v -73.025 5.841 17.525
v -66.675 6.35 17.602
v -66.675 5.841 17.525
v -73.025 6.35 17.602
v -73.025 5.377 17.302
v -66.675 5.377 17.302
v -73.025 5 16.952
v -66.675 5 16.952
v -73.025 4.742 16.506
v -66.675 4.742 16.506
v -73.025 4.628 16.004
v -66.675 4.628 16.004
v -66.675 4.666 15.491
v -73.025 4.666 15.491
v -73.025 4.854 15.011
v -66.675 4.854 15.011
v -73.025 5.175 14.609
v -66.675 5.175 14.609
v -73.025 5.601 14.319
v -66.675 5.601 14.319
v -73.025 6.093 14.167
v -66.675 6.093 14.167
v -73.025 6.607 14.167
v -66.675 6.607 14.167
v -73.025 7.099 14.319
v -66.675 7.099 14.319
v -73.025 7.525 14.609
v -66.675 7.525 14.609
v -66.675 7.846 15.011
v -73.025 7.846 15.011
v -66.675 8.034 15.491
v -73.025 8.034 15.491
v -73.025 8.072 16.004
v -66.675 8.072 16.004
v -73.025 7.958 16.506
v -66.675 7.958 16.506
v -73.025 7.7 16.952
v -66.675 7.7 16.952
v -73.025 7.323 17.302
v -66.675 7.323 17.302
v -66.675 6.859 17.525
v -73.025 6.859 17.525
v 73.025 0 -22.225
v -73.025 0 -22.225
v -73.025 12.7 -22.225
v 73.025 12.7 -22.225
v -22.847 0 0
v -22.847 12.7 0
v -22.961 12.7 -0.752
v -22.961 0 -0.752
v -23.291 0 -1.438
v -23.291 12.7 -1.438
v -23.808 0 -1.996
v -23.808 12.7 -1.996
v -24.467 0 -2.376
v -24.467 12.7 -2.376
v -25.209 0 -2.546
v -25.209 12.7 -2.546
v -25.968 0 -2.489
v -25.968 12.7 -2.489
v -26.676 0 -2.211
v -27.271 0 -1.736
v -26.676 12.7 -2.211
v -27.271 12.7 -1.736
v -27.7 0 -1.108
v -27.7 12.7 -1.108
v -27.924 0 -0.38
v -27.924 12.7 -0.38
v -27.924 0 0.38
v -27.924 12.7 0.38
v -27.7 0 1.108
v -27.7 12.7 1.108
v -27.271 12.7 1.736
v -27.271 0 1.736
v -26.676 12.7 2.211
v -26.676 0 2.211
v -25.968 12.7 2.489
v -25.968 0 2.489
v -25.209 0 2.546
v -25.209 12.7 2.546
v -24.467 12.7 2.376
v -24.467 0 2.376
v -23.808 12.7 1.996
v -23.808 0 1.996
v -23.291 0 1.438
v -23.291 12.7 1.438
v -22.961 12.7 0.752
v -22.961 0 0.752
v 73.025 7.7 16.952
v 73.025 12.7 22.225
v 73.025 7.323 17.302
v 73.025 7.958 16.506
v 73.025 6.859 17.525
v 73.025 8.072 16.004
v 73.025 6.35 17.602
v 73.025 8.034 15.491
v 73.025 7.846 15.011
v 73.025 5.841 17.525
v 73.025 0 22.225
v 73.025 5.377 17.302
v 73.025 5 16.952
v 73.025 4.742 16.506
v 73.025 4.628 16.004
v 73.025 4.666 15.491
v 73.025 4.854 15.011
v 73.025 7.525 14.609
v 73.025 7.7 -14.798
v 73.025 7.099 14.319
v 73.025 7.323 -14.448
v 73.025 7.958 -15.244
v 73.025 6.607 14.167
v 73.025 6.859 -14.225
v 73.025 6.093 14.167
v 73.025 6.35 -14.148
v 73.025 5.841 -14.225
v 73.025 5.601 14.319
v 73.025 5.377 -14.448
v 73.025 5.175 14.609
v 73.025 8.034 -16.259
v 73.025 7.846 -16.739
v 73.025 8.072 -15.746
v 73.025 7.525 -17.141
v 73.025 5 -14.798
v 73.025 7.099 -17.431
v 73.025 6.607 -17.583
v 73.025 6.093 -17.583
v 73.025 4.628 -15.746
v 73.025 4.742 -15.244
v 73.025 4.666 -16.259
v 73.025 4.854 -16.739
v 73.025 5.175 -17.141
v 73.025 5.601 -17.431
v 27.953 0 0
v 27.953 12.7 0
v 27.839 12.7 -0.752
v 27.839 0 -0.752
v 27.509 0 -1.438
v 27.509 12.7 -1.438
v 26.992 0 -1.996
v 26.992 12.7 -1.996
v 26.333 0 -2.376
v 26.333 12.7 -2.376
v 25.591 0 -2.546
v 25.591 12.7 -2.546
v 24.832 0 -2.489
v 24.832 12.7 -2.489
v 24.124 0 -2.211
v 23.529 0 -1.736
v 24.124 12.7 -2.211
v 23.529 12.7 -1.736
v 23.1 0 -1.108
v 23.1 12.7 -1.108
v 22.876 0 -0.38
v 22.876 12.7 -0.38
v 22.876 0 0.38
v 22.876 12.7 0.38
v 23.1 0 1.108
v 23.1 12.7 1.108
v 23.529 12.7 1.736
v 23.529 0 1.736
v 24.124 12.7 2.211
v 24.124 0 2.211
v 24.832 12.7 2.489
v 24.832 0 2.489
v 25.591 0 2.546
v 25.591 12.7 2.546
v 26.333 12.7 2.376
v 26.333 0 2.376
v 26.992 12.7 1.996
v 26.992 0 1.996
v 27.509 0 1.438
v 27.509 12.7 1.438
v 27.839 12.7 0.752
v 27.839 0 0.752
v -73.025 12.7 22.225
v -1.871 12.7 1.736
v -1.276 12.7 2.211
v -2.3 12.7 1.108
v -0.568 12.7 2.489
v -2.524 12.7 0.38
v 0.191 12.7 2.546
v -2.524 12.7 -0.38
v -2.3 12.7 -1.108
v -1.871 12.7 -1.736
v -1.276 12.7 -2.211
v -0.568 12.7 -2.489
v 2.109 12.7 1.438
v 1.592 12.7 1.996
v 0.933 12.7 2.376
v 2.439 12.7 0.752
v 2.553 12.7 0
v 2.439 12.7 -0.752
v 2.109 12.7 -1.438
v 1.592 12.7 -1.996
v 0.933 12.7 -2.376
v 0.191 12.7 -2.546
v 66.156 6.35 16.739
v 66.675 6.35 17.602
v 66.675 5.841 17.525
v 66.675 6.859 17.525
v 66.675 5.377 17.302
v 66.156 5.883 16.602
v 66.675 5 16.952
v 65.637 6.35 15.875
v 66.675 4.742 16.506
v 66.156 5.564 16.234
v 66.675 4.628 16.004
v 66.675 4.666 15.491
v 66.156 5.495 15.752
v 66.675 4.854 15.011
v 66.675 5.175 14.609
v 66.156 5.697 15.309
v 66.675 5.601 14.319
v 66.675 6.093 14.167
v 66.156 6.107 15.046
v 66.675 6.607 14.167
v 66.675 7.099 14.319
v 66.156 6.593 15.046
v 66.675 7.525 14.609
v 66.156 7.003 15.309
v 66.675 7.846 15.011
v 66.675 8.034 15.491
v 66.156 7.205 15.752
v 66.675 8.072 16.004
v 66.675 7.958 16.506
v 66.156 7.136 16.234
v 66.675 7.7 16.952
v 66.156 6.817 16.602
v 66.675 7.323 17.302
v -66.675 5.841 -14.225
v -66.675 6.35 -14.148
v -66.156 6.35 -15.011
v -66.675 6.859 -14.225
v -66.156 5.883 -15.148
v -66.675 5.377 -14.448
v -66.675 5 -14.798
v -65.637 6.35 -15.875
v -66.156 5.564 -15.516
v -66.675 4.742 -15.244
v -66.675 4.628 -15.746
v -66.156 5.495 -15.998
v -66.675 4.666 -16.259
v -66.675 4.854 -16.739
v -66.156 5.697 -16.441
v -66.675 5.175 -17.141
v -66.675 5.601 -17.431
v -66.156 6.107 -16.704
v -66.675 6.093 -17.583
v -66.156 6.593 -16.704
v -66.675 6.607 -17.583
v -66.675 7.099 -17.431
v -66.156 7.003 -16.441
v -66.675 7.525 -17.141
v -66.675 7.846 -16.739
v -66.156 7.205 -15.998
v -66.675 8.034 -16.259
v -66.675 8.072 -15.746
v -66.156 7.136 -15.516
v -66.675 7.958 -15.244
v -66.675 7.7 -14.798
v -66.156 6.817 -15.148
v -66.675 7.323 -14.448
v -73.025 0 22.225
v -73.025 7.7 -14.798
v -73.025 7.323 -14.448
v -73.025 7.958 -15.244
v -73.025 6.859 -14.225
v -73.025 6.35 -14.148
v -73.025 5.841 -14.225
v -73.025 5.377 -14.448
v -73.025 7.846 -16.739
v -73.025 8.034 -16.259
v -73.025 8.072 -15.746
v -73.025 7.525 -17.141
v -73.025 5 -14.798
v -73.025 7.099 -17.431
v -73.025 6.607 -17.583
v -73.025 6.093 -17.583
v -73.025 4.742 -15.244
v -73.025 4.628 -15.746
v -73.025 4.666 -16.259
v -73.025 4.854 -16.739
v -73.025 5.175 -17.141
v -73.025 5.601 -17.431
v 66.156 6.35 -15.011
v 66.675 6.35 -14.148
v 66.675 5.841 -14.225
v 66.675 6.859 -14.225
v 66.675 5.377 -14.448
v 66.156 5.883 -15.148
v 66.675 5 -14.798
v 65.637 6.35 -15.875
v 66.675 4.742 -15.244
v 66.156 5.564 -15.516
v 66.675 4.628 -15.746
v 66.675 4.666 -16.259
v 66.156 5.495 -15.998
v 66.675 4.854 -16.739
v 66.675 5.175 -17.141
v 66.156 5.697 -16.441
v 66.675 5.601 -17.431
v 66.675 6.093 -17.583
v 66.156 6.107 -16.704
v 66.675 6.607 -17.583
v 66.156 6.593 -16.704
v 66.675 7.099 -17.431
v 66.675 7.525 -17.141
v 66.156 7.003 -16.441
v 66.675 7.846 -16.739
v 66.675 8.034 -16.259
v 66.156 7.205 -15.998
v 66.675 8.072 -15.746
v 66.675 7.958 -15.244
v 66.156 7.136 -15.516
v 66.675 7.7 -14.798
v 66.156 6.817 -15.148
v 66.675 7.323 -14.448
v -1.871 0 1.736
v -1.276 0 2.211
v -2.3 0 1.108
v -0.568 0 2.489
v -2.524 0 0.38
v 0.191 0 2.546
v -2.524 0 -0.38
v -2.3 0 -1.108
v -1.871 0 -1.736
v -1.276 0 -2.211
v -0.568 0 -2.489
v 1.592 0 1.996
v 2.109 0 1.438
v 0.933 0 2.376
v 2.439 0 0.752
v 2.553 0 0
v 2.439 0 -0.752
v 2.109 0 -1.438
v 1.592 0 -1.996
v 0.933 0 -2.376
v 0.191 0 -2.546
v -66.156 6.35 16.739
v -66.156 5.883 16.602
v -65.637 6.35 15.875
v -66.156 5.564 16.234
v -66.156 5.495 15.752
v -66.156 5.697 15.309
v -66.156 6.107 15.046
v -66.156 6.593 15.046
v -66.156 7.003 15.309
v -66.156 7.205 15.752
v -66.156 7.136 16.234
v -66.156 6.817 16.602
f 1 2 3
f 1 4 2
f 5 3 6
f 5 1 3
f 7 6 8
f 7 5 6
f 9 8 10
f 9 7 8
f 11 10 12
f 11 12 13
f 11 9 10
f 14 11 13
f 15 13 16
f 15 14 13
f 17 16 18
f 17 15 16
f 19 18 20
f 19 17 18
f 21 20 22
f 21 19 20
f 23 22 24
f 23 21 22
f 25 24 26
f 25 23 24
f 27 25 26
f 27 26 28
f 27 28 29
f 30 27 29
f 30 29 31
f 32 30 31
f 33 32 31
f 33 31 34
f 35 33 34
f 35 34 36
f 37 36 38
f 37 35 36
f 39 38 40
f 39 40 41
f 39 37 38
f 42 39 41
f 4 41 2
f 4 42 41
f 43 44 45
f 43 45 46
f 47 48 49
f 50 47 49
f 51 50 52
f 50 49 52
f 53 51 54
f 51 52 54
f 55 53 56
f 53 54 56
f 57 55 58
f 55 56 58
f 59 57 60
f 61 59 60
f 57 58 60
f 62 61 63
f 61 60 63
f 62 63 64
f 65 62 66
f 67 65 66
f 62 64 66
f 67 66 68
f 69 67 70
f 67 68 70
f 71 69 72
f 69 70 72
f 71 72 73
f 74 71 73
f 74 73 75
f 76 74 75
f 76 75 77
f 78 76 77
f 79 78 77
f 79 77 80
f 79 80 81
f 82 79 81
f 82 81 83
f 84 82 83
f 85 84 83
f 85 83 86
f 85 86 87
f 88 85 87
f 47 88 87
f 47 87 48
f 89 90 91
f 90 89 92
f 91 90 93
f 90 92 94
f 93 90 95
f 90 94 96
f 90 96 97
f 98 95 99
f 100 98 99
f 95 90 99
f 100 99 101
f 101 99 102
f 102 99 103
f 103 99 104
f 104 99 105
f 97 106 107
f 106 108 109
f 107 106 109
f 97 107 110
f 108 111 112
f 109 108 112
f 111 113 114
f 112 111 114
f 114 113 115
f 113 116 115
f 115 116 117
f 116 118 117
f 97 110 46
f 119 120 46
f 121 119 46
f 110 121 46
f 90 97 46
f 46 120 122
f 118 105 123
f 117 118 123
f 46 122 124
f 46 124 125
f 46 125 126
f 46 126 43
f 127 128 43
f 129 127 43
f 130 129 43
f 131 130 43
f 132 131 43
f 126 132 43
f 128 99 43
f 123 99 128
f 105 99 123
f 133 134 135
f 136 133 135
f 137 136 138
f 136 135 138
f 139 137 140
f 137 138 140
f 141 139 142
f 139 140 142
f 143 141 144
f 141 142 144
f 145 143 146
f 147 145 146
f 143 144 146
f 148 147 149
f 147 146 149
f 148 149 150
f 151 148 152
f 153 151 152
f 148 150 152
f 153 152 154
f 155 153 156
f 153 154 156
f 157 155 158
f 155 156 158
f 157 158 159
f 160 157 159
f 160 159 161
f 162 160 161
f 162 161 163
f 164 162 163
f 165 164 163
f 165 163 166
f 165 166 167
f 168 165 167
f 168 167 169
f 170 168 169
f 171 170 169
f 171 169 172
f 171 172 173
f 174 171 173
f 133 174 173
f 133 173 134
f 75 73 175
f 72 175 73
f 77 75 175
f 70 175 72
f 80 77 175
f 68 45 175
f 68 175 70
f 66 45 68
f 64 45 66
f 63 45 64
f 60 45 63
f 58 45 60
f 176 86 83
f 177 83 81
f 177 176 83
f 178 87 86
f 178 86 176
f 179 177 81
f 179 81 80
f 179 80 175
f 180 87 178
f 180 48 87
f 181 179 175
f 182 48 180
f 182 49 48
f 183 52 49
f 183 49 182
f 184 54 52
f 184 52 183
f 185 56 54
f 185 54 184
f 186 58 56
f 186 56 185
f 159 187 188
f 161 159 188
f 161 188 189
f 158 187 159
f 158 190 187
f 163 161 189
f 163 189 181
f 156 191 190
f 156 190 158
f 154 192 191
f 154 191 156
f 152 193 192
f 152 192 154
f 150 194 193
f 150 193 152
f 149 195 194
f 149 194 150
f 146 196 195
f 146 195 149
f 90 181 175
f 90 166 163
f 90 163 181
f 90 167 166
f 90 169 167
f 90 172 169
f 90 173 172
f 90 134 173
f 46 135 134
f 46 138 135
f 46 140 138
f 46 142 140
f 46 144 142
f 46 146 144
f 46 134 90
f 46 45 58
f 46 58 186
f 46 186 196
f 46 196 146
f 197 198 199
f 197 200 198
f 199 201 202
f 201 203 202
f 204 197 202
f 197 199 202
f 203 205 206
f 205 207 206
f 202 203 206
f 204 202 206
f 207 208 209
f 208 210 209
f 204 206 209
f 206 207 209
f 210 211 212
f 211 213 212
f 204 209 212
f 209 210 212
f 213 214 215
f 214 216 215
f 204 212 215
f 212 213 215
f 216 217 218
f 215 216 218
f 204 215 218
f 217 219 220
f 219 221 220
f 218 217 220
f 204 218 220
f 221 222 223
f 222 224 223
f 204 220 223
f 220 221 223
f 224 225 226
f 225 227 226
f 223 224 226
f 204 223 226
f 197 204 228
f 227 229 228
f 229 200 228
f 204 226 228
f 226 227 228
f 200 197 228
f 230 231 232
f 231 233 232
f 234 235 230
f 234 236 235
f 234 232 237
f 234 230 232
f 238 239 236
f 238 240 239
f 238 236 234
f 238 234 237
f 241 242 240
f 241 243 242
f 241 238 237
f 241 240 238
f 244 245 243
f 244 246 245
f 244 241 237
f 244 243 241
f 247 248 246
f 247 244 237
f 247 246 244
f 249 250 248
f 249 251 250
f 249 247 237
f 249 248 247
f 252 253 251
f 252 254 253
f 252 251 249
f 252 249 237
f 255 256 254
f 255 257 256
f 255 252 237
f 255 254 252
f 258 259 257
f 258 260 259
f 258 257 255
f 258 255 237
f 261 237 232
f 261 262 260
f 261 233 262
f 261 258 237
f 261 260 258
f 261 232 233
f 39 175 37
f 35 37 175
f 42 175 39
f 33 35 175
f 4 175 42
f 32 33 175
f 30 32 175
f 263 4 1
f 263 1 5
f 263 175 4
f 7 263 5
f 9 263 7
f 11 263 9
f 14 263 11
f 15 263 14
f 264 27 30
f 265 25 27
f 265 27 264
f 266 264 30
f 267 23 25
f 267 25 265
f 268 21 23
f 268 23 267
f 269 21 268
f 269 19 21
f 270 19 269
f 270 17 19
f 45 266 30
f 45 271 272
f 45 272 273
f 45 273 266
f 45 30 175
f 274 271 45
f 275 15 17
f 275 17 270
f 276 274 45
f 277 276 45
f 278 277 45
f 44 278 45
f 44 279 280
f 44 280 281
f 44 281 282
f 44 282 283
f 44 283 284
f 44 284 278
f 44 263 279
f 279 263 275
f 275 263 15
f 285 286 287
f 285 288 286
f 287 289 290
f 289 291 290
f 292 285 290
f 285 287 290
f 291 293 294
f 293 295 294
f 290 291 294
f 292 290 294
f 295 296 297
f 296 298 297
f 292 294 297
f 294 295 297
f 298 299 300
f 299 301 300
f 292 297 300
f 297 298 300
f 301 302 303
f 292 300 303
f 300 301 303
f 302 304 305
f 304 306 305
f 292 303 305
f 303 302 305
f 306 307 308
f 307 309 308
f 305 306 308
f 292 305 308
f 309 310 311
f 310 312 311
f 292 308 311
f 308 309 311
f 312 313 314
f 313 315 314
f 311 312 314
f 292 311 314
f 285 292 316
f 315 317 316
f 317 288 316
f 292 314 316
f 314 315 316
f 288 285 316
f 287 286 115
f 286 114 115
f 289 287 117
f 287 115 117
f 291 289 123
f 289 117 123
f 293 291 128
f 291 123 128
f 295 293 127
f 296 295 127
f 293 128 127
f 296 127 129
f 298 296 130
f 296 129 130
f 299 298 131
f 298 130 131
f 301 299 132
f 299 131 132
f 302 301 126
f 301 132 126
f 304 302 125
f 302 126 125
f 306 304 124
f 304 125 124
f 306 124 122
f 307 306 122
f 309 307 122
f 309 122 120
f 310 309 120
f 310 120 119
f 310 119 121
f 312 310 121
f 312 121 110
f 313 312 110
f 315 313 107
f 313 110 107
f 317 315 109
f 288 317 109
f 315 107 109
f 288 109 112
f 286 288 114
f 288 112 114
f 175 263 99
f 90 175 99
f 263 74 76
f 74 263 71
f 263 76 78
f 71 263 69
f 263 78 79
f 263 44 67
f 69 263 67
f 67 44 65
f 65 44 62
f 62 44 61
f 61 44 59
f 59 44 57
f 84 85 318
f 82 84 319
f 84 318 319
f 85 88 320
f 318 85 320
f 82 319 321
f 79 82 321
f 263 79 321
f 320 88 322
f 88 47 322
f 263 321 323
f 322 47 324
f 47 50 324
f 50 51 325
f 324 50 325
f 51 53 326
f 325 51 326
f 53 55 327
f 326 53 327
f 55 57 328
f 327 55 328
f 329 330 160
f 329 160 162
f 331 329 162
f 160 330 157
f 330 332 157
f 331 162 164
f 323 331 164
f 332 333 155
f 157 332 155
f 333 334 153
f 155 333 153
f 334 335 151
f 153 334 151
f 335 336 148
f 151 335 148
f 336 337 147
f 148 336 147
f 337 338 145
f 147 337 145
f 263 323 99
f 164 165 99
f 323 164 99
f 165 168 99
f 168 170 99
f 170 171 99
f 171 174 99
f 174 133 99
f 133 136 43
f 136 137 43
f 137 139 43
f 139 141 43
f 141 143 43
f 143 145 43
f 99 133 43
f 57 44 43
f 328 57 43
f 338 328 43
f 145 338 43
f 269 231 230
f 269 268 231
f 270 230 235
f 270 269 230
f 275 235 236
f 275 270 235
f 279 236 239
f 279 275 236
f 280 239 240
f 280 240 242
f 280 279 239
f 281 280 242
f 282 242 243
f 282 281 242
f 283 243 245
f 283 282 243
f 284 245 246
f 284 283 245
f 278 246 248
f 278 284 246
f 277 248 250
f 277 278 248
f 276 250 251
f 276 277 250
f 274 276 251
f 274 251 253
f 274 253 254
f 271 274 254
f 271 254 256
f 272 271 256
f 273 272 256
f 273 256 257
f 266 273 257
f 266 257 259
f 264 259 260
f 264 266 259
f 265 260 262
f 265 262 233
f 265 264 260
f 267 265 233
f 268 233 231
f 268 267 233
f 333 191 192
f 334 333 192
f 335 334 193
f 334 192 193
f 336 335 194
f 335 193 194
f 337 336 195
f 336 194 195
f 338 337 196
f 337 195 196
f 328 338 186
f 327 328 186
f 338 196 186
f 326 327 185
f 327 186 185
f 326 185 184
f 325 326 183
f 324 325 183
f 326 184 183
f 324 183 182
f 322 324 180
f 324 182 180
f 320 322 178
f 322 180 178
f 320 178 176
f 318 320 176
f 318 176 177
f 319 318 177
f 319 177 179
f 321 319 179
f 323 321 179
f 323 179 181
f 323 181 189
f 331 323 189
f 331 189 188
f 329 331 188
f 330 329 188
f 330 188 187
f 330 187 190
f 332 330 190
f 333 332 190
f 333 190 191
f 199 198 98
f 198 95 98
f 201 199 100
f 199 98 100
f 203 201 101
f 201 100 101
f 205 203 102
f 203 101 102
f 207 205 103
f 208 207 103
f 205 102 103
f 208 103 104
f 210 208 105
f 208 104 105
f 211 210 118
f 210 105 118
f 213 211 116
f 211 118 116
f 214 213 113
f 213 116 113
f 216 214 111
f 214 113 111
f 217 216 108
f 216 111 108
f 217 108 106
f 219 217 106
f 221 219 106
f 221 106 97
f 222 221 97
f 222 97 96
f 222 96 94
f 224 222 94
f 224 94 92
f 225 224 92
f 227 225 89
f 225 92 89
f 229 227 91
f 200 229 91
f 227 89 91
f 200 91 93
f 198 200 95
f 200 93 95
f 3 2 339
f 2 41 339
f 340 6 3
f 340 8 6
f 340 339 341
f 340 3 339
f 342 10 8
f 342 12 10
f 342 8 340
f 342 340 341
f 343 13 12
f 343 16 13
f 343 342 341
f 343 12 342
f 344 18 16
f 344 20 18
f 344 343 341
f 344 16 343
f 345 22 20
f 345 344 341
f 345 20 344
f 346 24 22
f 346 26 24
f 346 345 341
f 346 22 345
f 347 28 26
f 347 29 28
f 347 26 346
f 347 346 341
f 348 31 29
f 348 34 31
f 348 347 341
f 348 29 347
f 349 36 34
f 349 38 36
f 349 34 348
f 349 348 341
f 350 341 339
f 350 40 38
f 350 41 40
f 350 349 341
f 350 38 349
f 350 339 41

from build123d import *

# Parameters (mm, degrees)
SKETCH2_W                      = 146.05
SKETCH2_H                      = 44.45
BOSS_EXTRUDE1_DEPTH            = 12.7
F_1_4_20_TAPPED_HOLE1_D        = 5.1054
F_8_32_TAPPED_HOLE1_AT_2_COUNT = 2
F_8_32_TAPPED_HOLE1_AT_2_PITCH = 31.75


with BuildPart() as part:
    # Sketch2 → Boss-Extrude1 (new body)
    with BuildSketch(Plane(origin=(0, 0, 0), x_dir=(1, 0, 0), z_dir=(0, 1, 0))):
        Rectangle(SKETCH2_W, SKETCH2_H)
    extrude(amount=BOSS_EXTRUDE1_DEPTH)

    # 1/4-20 Tapped Hole1 (through all)
    with Locations(Plane(origin=(0, 0, 0), x_dir=(-1, 0, 0), z_dir=(0, -1, 0))):
        with Locations((0, 0), (-25.4, 0), (25.4, 0)):
            Hole(F_1_4_20_TAPPED_HOLE1_D / 2)

    # Sketch7 → #8-32 Tapped Hole1 (revolve, cut)
    with BuildSketch(Plane(origin=(-73.025, 6.35, -15.875), x_dir=(0, 0, 1), z_dir=(0, 1, 0))):
        Polygon((0, 0), (0, 7.387806461), (1.7272, 6.35), (1.7272, 0), align=None)
    f_8_32_tapped_hole1 = revolve(axis=Axis((-79.375, 6.35, -15.875), (1, 0, 0)), mode=Mode.SUBTRACT)

    # #8-32 Tapped Hole1 at 2: #8-32 Tapped Hole1 ×2
    with Locations(*[(0, 0, i * F_8_32_TAPPED_HOLE1_AT_2_PITCH) for i in range(1, F_8_32_TAPPED_HOLE1_AT_2_COUNT)]):
        add(f_8_32_tapped_hole1, mode=Mode.SUBTRACT)

    # Mirror1: #8-32 Tapped Hole1 across plane
    add(f_8_32_tapped_hole1.mirror(Plane(origin=(0, 0, 0), x_dir=(0, 0, 1), z_dir=(1, 0, 0))), mode=Mode.SUBTRACT)

    # Mirror1 copy 1 sketch → Mirror1 copy 1 (revolve, cut)
    with BuildSketch(Plane(origin=(73.025, 6.35, 15.875), x_dir=(0, 0, 1), z_dir=(0, 1, 0))):
        Polygon((0, 0), (0, -7.387806461), (1.7272, -6.35), (1.7272, 0), align=None)
    revolve(axis=Axis((79.375, 6.35, 15.875), (1, 0, 0)), mode=Mode.SUBTRACT)


solid = part.part
